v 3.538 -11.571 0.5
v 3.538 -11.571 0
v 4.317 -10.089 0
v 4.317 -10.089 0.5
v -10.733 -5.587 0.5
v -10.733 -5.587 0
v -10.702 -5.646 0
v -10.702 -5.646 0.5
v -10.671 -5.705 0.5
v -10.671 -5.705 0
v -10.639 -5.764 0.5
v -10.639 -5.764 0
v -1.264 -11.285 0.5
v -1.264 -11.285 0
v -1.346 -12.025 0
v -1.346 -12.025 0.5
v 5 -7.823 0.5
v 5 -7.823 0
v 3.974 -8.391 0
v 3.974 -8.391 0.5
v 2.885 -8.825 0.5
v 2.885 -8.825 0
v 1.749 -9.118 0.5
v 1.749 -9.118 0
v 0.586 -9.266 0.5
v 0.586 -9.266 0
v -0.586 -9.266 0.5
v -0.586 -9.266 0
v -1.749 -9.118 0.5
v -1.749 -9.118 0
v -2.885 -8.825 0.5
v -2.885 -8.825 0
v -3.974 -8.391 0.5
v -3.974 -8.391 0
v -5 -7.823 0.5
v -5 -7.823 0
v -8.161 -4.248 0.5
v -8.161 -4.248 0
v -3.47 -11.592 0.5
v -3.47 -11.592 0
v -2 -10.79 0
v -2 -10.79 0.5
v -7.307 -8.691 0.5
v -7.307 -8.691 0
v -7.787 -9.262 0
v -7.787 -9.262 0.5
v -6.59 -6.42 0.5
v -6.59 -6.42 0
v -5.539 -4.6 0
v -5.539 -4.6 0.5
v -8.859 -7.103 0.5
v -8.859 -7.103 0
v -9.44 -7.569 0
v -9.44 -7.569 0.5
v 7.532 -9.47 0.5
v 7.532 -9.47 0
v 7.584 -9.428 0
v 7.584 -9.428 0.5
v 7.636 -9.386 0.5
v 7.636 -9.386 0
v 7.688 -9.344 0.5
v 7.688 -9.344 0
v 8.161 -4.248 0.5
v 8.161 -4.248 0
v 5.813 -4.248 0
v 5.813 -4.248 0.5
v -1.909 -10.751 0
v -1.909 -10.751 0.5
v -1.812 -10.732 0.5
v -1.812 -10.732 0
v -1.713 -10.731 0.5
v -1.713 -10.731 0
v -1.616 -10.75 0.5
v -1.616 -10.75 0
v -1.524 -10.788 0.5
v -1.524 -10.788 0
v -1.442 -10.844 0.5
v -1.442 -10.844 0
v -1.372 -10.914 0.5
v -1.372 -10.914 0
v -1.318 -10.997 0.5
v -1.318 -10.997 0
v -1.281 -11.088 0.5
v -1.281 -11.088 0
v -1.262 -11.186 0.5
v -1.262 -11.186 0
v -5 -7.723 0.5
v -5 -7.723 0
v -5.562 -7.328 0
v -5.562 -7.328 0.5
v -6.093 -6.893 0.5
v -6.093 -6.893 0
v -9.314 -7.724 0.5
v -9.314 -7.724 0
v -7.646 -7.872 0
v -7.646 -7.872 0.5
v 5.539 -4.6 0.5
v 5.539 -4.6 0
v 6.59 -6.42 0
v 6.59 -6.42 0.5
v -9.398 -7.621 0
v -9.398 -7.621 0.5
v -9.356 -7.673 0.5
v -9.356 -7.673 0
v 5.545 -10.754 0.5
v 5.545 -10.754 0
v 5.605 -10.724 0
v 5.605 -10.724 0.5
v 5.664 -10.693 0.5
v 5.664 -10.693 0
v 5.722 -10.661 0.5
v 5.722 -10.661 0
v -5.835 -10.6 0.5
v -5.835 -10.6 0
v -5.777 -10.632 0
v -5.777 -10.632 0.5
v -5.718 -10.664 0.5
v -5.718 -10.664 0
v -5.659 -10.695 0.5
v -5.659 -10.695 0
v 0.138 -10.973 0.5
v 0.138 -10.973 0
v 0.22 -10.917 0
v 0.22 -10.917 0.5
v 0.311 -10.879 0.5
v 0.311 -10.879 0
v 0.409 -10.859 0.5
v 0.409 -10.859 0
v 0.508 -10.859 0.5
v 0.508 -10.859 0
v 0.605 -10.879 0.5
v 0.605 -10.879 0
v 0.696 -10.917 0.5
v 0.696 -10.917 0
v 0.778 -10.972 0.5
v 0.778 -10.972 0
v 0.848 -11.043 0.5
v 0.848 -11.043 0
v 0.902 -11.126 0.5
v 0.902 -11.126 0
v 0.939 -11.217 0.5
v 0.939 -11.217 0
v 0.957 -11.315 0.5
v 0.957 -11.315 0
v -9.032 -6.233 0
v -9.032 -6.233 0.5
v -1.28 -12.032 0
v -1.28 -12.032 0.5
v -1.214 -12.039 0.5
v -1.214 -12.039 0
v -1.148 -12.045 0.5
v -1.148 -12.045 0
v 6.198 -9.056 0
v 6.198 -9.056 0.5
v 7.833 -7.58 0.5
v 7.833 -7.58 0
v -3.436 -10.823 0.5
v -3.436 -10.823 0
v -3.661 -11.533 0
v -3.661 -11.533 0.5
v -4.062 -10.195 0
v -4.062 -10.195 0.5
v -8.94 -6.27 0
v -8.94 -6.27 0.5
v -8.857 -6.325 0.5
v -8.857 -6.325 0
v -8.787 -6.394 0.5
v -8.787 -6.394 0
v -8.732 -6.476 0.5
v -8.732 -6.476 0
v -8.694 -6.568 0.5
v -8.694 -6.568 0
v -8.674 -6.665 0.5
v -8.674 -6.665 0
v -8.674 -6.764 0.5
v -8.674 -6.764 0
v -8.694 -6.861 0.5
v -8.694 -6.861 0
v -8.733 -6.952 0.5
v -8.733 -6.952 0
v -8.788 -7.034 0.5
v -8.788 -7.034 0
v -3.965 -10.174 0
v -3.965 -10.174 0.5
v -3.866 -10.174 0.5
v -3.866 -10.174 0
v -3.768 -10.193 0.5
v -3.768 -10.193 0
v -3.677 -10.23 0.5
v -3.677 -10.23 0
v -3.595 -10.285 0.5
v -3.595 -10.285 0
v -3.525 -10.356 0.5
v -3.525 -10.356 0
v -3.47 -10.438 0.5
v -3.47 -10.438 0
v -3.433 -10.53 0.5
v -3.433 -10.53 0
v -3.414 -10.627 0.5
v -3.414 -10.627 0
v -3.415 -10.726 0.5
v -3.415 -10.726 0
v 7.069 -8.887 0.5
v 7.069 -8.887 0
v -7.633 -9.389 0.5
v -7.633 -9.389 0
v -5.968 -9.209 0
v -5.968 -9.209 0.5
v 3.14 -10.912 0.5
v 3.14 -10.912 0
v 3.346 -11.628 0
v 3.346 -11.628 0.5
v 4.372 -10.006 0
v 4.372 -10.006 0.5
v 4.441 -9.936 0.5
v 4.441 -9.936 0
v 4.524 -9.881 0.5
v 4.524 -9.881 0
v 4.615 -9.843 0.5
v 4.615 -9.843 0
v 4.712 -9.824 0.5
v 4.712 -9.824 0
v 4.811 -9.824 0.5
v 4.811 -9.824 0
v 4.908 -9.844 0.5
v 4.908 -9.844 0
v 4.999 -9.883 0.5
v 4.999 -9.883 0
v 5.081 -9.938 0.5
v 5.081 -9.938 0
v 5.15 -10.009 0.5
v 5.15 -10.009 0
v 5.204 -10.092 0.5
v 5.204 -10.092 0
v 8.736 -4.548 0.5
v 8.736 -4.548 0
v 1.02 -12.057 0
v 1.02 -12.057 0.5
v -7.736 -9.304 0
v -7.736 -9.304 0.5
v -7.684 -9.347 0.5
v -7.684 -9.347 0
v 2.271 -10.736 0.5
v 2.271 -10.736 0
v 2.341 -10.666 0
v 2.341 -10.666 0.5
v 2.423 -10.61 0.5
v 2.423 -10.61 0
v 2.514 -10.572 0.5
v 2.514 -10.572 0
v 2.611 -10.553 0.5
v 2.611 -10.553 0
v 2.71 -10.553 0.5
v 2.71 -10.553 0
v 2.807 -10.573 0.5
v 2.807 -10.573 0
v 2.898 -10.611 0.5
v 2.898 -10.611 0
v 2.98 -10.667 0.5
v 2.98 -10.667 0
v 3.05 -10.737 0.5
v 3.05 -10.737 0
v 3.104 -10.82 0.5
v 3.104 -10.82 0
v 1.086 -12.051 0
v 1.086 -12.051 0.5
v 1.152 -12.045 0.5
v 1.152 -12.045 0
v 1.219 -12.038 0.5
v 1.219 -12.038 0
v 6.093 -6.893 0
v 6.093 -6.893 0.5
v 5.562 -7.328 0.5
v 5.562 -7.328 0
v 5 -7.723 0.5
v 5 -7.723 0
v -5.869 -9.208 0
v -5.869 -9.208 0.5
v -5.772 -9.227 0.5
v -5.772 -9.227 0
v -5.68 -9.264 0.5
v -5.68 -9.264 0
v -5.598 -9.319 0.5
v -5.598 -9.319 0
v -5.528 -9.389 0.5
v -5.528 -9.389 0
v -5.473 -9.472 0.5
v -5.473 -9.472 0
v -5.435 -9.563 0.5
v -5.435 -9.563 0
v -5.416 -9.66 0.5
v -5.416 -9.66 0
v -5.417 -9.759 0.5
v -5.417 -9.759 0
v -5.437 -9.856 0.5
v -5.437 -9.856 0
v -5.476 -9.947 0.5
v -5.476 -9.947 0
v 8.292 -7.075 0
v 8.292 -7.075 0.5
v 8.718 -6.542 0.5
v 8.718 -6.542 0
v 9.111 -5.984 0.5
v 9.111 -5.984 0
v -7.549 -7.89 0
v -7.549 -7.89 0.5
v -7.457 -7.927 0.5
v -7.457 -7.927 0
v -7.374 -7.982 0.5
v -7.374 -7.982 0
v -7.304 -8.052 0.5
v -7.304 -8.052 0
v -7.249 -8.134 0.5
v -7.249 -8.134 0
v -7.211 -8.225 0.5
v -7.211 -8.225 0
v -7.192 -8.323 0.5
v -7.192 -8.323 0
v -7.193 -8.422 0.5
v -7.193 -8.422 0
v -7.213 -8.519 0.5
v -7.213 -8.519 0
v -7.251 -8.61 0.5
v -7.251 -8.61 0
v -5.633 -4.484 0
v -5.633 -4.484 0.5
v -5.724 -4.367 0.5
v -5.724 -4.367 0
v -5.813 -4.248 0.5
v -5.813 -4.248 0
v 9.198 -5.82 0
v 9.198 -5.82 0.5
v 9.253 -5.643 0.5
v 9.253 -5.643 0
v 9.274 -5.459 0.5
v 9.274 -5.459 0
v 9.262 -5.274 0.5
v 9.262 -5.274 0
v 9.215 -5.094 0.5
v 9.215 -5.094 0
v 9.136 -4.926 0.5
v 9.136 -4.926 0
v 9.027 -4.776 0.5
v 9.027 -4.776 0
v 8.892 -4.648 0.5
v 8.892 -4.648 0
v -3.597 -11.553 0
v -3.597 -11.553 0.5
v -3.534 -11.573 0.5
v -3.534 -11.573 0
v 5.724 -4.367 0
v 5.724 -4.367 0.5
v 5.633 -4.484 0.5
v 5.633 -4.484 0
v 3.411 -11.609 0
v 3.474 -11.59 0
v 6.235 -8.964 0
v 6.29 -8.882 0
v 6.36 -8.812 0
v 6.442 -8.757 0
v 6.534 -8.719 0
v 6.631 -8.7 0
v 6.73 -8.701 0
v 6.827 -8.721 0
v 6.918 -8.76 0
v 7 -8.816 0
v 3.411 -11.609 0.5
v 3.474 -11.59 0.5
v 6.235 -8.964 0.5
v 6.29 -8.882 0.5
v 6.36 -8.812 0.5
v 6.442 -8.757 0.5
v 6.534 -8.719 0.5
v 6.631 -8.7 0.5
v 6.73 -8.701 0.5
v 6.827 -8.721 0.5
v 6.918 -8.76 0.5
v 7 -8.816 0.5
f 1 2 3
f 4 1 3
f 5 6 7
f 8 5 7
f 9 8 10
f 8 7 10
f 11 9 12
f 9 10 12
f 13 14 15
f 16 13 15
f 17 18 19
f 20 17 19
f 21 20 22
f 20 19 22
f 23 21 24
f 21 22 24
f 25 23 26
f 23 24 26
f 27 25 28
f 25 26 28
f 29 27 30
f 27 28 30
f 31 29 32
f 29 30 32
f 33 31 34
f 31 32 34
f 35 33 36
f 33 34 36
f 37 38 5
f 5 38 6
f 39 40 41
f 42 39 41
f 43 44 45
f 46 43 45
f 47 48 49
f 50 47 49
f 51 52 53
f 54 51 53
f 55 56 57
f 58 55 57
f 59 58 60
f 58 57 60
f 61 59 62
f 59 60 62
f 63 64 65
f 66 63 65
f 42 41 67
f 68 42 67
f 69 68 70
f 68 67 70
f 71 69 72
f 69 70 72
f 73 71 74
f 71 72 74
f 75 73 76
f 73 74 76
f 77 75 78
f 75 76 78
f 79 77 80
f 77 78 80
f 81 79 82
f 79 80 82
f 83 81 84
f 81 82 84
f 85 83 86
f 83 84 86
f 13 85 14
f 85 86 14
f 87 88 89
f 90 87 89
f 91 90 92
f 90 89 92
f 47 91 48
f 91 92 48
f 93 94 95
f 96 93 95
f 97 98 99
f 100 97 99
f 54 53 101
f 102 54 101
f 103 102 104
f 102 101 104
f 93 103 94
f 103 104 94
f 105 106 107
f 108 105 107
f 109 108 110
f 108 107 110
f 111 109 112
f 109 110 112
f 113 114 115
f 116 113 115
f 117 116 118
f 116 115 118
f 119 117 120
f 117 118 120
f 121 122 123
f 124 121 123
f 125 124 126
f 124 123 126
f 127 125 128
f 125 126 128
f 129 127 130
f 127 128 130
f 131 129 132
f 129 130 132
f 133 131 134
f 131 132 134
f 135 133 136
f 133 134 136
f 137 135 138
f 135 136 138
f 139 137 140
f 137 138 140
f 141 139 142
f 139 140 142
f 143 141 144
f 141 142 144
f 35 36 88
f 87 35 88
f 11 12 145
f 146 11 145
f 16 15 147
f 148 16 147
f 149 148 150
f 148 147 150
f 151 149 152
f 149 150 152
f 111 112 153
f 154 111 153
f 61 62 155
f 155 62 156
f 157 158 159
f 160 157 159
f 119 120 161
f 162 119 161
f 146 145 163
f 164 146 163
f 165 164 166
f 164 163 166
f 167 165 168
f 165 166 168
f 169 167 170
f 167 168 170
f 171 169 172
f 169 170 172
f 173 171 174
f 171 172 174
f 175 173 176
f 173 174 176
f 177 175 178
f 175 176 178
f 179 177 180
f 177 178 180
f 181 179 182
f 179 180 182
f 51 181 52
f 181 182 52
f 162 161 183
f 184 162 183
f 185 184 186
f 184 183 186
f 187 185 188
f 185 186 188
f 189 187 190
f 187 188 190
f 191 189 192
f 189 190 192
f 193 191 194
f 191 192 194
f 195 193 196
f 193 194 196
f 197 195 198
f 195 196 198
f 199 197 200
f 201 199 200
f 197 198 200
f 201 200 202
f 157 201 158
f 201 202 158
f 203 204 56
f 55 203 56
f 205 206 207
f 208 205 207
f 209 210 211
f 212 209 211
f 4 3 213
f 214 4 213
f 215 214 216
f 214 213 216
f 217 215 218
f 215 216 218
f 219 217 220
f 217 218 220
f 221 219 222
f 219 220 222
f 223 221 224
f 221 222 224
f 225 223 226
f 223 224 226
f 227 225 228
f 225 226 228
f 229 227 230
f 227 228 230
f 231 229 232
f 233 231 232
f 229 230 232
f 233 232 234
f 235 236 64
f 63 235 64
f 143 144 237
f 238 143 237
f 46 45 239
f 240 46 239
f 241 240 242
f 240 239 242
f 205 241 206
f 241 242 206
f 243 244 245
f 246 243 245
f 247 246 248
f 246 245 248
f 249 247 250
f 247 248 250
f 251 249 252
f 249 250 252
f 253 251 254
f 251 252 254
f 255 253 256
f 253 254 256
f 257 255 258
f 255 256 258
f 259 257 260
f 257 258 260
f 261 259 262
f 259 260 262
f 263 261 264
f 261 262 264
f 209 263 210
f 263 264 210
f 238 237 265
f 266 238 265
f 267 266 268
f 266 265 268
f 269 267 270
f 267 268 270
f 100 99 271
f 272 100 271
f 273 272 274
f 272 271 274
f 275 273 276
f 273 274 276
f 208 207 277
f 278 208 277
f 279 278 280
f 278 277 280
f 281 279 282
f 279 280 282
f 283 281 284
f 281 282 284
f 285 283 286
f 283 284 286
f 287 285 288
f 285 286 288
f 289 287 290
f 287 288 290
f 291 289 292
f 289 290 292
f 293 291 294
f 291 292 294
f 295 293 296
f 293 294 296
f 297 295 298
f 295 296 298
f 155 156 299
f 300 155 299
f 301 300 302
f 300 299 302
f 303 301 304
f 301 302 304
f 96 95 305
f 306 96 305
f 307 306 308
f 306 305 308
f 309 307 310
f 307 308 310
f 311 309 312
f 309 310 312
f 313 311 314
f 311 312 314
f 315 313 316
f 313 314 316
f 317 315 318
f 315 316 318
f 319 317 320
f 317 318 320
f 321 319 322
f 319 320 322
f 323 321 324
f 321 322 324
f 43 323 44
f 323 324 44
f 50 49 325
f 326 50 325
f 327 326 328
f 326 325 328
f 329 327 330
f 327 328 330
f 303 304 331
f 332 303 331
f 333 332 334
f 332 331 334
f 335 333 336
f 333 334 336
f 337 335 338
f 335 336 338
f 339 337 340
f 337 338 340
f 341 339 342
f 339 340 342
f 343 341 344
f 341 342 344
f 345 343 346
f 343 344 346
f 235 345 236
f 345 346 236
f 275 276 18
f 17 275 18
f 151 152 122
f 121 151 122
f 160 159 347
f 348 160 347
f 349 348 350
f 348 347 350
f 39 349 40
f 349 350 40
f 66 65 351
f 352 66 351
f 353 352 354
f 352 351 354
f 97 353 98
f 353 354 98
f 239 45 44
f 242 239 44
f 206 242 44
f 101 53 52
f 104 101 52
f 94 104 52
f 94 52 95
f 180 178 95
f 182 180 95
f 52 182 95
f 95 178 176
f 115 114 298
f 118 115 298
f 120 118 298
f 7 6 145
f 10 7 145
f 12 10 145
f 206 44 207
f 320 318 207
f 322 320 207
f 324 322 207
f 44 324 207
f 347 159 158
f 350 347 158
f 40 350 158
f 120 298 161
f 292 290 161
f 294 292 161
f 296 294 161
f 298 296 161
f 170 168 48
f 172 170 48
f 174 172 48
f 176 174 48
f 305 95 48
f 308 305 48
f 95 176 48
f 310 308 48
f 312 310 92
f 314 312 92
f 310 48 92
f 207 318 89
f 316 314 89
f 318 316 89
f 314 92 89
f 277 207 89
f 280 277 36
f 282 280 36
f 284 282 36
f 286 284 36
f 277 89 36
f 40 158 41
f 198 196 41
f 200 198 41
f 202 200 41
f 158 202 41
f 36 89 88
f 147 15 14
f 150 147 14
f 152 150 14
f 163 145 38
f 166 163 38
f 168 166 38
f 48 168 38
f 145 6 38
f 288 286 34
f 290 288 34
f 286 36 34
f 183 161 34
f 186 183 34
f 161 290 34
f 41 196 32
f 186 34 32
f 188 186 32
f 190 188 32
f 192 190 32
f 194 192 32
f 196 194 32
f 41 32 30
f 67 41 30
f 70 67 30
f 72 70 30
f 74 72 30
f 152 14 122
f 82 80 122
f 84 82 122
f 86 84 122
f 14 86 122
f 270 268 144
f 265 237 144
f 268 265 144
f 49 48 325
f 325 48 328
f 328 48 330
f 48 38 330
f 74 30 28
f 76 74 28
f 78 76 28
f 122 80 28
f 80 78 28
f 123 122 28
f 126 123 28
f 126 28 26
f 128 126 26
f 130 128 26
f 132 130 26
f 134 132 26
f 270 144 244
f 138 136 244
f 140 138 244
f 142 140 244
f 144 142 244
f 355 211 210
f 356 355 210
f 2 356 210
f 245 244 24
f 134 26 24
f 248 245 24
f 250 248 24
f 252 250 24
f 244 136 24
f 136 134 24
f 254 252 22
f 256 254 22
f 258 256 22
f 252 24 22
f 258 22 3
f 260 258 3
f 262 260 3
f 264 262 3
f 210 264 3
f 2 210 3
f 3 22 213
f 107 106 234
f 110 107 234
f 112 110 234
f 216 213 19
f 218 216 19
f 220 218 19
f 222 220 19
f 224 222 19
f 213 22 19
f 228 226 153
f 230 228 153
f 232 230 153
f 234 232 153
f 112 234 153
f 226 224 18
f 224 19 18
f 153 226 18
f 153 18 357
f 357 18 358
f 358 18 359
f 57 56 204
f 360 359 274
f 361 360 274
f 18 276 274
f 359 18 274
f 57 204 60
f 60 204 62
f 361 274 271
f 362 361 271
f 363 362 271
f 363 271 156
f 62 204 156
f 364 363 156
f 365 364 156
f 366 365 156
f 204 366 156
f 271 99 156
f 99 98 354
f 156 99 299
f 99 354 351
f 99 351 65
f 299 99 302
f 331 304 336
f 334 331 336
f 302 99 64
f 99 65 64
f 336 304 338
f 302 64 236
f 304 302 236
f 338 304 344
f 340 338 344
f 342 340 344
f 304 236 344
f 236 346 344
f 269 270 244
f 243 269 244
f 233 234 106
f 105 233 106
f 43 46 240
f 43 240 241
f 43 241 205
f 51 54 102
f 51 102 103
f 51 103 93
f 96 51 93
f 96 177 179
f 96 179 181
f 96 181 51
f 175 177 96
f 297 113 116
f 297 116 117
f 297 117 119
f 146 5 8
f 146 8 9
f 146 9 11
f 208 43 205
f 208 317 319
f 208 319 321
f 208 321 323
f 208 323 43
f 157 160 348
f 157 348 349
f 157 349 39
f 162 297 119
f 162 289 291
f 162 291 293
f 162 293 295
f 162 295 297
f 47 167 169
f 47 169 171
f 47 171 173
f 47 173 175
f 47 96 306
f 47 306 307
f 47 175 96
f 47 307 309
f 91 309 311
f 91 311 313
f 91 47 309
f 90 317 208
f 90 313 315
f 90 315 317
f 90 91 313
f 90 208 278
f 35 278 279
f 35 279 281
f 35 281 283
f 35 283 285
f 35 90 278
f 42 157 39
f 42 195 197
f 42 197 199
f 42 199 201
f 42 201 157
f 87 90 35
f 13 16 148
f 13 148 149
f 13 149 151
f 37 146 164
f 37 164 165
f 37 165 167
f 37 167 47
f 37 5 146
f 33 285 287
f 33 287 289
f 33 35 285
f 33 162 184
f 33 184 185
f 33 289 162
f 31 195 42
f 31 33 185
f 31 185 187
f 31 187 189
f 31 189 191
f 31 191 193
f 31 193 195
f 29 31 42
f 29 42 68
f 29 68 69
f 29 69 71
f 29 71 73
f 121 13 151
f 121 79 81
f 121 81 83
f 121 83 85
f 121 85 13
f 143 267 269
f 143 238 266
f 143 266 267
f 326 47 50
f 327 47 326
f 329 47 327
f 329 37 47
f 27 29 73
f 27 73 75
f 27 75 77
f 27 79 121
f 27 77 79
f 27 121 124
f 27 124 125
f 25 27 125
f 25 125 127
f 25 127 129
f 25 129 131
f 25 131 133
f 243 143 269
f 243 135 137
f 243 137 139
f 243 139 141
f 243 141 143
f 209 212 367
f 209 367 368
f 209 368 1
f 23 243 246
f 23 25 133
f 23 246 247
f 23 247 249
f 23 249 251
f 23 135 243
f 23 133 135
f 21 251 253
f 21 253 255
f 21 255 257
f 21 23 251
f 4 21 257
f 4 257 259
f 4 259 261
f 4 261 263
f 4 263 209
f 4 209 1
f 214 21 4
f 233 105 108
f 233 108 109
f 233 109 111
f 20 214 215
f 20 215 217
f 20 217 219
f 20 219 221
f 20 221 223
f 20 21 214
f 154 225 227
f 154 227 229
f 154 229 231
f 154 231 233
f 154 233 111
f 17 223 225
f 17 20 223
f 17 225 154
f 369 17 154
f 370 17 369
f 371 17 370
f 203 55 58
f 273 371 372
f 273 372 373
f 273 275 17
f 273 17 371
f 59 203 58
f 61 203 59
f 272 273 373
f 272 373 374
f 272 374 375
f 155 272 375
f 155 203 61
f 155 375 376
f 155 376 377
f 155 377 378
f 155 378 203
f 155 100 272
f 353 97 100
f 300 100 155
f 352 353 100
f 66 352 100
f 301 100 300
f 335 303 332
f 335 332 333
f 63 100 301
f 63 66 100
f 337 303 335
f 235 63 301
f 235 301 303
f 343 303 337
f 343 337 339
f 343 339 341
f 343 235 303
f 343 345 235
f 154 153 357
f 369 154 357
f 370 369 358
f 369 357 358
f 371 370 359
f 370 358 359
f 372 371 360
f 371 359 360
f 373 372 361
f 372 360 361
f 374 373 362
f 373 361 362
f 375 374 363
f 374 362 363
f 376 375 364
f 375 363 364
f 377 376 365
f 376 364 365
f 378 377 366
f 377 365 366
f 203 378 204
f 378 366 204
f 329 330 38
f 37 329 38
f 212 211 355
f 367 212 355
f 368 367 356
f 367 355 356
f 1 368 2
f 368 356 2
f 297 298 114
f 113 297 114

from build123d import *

# Parameters (mm, degrees)
F1_DEPTH = 0.5


with BuildPart() as f1:
    # F0 (on Top) → F1 (new body)
    with BuildSketch(Plane.XY):
        with BuildLine():
            Line((-5.81324, -4.248087), (-8.1605, -4.248087))
            Line((-8.1605, -4.248087), (-10.732831, -5.587158))
            ThreePointArc((-10.732831, -5.587158), (-10.68629, -5.675668), (-10.639018, -5.763791))
            Line((-10.639018, -5.763791), (-9.031771, -6.233106))
            ThreePointArc((-9.031771, -6.233106), (-8.681479, -6.615756), (-8.859146, -7.103157))
            Line((-8.859146, -7.103157), (-9.440273, -7.569098))
            ThreePointArc((-9.440273, -7.569098), (-9.377396, -7.646858), (-9.313879, -7.724096))
            Line((-9.313879, -7.724096), (-7.646027, -7.871644))
            ThreePointArc((-7.646027, -7.871644), (-7.227963, -8.178805), (-7.307377, -8.691464))
            Line((-7.307377, -8.691464), (-7.786714, -9.261592))
            ThreePointArc((-7.786714, -9.261592), (-7.709906, -9.325629), (-7.632571, -9.389028))
            Line((-7.632571, -9.389028), (-5.967894, -9.209166))
            ThreePointArc((-5.967894, -9.209166), (-5.498046, -9.429093), (-5.476171, -9.947405))
            Line((-5.476171, -9.947405), (-5.835387, -10.599918))
            ThreePointArc((-5.835387, -10.599918), (-5.747585, -10.647782), (-5.659391, -10.694919))
            Line((-5.659391, -10.694919), (-4.061547, -10.194525))
            ThreePointArc((-4.061547, -10.194525), (-3.55788, -10.318807), (-3.435553, -10.822952))
            Line((-3.435553, -10.822952), (-3.660912, -11.532897))
            ThreePointArc((-3.660912, -11.532897), (-3.565474, -11.562759), (-3.469792, -11.591831))
            Line((-3.469792, -11.591831), (-1.999883, -10.790041))
            ThreePointArc((-1.999883, -10.790041), (-1.48166, -10.813925), (-1.263558, -11.284624))
            Line((-1.263558, -11.284624), (-1.346442, -12.024853))
            ThreePointArc((-1.346442, -12.024853), (-1.247017, -12.03557), (-1.147507, -12.045465))
            Line((-1.147507, -12.045465), (0.138257, -10.972939))
            ThreePointArc((0.138257, -10.972939), (0.651219, -10.895513), (0.956757, -11.314766))
            Line((0.956757, -11.314766), (1.019517, -12.056973))
            ThreePointArc((1.019517, -12.056973), (1.119126, -12.048135), (1.218659, -12.038475))
            Line((1.218659, -12.038475), (2.271109, -10.736227))
            ThreePointArc((2.271109, -10.736227), (2.759196, -10.560452), (3.140484, -10.912226))
            Line((3.140484, -10.912226), (3.346488, -11.628027))
            ThreePointArc((3.346488, -11.628027), (3.442474, -11.599973), (3.538224, -11.571127))
            Line((3.538224, -11.571127), (4.317114, -10.088956))
            ThreePointArc((4.317114, -10.088956), (4.76166, -9.821553), (5.204118, -10.092396))
            Line((5.204118, -10.092396), (5.545489, -10.75442))
            ThreePointArc((5.545489, -10.75442), (5.634179, -10.708222), (5.722484, -10.661293))
            Line((5.722484, -10.661293), (6.19803, -9.055879))
            ThreePointArc((6.19803, -9.055879), (6.582035, -8.707073), (7.068744, -8.886629))
            Line((7.068744, -8.886629), (7.532427, -9.469559))
            ThreePointArc((7.532427, -9.469559), (7.610431, -9.406984), (7.687914, -9.343766))
            Line((7.687914, -9.343766), (7.833117, -7.579728))
            ThreePointArc((7.833117, -7.579728), (8.509339, -6.811839), (9.110578, -5.983926))
            ThreePointArc((9.110578, -5.983926), (9.242449, -5.18285), (8.736494, -4.547931))
            Line((8.736494, -4.547931), (8.1605, -4.248087))
            Line((8.1605, -4.248087), (5.81324, -4.248087))
            ThreePointArc((5.81324, -4.248087), (5.678957, -4.425997), (5.539231, -4.599665))
            Line((5.539231, -4.599665), (6.59, -6.41965))
            ThreePointArc((6.59, -6.41965), (5.83151, -7.115722), (5, -7.722694))
            Line((5, -7.722694), (5, -7.822694))
            ThreePointArc((5, -7.822694), (0, -9.284101), (-5, -7.822694))
            Line((-5, -7.822694), (-5, -7.722694))
            ThreePointArc((-5, -7.722694), (-5.83151, -7.115722), (-6.59, -6.41965))
            Line((-6.59, -6.41965), (-5.539231, -4.599665))
            ThreePointArc((-5.539231, -4.599665), (-5.678957, -4.425997), (-5.81324, -4.248087))
        make_face()
    extrude(amount=F1_DEPTH)


solid = f1.part
